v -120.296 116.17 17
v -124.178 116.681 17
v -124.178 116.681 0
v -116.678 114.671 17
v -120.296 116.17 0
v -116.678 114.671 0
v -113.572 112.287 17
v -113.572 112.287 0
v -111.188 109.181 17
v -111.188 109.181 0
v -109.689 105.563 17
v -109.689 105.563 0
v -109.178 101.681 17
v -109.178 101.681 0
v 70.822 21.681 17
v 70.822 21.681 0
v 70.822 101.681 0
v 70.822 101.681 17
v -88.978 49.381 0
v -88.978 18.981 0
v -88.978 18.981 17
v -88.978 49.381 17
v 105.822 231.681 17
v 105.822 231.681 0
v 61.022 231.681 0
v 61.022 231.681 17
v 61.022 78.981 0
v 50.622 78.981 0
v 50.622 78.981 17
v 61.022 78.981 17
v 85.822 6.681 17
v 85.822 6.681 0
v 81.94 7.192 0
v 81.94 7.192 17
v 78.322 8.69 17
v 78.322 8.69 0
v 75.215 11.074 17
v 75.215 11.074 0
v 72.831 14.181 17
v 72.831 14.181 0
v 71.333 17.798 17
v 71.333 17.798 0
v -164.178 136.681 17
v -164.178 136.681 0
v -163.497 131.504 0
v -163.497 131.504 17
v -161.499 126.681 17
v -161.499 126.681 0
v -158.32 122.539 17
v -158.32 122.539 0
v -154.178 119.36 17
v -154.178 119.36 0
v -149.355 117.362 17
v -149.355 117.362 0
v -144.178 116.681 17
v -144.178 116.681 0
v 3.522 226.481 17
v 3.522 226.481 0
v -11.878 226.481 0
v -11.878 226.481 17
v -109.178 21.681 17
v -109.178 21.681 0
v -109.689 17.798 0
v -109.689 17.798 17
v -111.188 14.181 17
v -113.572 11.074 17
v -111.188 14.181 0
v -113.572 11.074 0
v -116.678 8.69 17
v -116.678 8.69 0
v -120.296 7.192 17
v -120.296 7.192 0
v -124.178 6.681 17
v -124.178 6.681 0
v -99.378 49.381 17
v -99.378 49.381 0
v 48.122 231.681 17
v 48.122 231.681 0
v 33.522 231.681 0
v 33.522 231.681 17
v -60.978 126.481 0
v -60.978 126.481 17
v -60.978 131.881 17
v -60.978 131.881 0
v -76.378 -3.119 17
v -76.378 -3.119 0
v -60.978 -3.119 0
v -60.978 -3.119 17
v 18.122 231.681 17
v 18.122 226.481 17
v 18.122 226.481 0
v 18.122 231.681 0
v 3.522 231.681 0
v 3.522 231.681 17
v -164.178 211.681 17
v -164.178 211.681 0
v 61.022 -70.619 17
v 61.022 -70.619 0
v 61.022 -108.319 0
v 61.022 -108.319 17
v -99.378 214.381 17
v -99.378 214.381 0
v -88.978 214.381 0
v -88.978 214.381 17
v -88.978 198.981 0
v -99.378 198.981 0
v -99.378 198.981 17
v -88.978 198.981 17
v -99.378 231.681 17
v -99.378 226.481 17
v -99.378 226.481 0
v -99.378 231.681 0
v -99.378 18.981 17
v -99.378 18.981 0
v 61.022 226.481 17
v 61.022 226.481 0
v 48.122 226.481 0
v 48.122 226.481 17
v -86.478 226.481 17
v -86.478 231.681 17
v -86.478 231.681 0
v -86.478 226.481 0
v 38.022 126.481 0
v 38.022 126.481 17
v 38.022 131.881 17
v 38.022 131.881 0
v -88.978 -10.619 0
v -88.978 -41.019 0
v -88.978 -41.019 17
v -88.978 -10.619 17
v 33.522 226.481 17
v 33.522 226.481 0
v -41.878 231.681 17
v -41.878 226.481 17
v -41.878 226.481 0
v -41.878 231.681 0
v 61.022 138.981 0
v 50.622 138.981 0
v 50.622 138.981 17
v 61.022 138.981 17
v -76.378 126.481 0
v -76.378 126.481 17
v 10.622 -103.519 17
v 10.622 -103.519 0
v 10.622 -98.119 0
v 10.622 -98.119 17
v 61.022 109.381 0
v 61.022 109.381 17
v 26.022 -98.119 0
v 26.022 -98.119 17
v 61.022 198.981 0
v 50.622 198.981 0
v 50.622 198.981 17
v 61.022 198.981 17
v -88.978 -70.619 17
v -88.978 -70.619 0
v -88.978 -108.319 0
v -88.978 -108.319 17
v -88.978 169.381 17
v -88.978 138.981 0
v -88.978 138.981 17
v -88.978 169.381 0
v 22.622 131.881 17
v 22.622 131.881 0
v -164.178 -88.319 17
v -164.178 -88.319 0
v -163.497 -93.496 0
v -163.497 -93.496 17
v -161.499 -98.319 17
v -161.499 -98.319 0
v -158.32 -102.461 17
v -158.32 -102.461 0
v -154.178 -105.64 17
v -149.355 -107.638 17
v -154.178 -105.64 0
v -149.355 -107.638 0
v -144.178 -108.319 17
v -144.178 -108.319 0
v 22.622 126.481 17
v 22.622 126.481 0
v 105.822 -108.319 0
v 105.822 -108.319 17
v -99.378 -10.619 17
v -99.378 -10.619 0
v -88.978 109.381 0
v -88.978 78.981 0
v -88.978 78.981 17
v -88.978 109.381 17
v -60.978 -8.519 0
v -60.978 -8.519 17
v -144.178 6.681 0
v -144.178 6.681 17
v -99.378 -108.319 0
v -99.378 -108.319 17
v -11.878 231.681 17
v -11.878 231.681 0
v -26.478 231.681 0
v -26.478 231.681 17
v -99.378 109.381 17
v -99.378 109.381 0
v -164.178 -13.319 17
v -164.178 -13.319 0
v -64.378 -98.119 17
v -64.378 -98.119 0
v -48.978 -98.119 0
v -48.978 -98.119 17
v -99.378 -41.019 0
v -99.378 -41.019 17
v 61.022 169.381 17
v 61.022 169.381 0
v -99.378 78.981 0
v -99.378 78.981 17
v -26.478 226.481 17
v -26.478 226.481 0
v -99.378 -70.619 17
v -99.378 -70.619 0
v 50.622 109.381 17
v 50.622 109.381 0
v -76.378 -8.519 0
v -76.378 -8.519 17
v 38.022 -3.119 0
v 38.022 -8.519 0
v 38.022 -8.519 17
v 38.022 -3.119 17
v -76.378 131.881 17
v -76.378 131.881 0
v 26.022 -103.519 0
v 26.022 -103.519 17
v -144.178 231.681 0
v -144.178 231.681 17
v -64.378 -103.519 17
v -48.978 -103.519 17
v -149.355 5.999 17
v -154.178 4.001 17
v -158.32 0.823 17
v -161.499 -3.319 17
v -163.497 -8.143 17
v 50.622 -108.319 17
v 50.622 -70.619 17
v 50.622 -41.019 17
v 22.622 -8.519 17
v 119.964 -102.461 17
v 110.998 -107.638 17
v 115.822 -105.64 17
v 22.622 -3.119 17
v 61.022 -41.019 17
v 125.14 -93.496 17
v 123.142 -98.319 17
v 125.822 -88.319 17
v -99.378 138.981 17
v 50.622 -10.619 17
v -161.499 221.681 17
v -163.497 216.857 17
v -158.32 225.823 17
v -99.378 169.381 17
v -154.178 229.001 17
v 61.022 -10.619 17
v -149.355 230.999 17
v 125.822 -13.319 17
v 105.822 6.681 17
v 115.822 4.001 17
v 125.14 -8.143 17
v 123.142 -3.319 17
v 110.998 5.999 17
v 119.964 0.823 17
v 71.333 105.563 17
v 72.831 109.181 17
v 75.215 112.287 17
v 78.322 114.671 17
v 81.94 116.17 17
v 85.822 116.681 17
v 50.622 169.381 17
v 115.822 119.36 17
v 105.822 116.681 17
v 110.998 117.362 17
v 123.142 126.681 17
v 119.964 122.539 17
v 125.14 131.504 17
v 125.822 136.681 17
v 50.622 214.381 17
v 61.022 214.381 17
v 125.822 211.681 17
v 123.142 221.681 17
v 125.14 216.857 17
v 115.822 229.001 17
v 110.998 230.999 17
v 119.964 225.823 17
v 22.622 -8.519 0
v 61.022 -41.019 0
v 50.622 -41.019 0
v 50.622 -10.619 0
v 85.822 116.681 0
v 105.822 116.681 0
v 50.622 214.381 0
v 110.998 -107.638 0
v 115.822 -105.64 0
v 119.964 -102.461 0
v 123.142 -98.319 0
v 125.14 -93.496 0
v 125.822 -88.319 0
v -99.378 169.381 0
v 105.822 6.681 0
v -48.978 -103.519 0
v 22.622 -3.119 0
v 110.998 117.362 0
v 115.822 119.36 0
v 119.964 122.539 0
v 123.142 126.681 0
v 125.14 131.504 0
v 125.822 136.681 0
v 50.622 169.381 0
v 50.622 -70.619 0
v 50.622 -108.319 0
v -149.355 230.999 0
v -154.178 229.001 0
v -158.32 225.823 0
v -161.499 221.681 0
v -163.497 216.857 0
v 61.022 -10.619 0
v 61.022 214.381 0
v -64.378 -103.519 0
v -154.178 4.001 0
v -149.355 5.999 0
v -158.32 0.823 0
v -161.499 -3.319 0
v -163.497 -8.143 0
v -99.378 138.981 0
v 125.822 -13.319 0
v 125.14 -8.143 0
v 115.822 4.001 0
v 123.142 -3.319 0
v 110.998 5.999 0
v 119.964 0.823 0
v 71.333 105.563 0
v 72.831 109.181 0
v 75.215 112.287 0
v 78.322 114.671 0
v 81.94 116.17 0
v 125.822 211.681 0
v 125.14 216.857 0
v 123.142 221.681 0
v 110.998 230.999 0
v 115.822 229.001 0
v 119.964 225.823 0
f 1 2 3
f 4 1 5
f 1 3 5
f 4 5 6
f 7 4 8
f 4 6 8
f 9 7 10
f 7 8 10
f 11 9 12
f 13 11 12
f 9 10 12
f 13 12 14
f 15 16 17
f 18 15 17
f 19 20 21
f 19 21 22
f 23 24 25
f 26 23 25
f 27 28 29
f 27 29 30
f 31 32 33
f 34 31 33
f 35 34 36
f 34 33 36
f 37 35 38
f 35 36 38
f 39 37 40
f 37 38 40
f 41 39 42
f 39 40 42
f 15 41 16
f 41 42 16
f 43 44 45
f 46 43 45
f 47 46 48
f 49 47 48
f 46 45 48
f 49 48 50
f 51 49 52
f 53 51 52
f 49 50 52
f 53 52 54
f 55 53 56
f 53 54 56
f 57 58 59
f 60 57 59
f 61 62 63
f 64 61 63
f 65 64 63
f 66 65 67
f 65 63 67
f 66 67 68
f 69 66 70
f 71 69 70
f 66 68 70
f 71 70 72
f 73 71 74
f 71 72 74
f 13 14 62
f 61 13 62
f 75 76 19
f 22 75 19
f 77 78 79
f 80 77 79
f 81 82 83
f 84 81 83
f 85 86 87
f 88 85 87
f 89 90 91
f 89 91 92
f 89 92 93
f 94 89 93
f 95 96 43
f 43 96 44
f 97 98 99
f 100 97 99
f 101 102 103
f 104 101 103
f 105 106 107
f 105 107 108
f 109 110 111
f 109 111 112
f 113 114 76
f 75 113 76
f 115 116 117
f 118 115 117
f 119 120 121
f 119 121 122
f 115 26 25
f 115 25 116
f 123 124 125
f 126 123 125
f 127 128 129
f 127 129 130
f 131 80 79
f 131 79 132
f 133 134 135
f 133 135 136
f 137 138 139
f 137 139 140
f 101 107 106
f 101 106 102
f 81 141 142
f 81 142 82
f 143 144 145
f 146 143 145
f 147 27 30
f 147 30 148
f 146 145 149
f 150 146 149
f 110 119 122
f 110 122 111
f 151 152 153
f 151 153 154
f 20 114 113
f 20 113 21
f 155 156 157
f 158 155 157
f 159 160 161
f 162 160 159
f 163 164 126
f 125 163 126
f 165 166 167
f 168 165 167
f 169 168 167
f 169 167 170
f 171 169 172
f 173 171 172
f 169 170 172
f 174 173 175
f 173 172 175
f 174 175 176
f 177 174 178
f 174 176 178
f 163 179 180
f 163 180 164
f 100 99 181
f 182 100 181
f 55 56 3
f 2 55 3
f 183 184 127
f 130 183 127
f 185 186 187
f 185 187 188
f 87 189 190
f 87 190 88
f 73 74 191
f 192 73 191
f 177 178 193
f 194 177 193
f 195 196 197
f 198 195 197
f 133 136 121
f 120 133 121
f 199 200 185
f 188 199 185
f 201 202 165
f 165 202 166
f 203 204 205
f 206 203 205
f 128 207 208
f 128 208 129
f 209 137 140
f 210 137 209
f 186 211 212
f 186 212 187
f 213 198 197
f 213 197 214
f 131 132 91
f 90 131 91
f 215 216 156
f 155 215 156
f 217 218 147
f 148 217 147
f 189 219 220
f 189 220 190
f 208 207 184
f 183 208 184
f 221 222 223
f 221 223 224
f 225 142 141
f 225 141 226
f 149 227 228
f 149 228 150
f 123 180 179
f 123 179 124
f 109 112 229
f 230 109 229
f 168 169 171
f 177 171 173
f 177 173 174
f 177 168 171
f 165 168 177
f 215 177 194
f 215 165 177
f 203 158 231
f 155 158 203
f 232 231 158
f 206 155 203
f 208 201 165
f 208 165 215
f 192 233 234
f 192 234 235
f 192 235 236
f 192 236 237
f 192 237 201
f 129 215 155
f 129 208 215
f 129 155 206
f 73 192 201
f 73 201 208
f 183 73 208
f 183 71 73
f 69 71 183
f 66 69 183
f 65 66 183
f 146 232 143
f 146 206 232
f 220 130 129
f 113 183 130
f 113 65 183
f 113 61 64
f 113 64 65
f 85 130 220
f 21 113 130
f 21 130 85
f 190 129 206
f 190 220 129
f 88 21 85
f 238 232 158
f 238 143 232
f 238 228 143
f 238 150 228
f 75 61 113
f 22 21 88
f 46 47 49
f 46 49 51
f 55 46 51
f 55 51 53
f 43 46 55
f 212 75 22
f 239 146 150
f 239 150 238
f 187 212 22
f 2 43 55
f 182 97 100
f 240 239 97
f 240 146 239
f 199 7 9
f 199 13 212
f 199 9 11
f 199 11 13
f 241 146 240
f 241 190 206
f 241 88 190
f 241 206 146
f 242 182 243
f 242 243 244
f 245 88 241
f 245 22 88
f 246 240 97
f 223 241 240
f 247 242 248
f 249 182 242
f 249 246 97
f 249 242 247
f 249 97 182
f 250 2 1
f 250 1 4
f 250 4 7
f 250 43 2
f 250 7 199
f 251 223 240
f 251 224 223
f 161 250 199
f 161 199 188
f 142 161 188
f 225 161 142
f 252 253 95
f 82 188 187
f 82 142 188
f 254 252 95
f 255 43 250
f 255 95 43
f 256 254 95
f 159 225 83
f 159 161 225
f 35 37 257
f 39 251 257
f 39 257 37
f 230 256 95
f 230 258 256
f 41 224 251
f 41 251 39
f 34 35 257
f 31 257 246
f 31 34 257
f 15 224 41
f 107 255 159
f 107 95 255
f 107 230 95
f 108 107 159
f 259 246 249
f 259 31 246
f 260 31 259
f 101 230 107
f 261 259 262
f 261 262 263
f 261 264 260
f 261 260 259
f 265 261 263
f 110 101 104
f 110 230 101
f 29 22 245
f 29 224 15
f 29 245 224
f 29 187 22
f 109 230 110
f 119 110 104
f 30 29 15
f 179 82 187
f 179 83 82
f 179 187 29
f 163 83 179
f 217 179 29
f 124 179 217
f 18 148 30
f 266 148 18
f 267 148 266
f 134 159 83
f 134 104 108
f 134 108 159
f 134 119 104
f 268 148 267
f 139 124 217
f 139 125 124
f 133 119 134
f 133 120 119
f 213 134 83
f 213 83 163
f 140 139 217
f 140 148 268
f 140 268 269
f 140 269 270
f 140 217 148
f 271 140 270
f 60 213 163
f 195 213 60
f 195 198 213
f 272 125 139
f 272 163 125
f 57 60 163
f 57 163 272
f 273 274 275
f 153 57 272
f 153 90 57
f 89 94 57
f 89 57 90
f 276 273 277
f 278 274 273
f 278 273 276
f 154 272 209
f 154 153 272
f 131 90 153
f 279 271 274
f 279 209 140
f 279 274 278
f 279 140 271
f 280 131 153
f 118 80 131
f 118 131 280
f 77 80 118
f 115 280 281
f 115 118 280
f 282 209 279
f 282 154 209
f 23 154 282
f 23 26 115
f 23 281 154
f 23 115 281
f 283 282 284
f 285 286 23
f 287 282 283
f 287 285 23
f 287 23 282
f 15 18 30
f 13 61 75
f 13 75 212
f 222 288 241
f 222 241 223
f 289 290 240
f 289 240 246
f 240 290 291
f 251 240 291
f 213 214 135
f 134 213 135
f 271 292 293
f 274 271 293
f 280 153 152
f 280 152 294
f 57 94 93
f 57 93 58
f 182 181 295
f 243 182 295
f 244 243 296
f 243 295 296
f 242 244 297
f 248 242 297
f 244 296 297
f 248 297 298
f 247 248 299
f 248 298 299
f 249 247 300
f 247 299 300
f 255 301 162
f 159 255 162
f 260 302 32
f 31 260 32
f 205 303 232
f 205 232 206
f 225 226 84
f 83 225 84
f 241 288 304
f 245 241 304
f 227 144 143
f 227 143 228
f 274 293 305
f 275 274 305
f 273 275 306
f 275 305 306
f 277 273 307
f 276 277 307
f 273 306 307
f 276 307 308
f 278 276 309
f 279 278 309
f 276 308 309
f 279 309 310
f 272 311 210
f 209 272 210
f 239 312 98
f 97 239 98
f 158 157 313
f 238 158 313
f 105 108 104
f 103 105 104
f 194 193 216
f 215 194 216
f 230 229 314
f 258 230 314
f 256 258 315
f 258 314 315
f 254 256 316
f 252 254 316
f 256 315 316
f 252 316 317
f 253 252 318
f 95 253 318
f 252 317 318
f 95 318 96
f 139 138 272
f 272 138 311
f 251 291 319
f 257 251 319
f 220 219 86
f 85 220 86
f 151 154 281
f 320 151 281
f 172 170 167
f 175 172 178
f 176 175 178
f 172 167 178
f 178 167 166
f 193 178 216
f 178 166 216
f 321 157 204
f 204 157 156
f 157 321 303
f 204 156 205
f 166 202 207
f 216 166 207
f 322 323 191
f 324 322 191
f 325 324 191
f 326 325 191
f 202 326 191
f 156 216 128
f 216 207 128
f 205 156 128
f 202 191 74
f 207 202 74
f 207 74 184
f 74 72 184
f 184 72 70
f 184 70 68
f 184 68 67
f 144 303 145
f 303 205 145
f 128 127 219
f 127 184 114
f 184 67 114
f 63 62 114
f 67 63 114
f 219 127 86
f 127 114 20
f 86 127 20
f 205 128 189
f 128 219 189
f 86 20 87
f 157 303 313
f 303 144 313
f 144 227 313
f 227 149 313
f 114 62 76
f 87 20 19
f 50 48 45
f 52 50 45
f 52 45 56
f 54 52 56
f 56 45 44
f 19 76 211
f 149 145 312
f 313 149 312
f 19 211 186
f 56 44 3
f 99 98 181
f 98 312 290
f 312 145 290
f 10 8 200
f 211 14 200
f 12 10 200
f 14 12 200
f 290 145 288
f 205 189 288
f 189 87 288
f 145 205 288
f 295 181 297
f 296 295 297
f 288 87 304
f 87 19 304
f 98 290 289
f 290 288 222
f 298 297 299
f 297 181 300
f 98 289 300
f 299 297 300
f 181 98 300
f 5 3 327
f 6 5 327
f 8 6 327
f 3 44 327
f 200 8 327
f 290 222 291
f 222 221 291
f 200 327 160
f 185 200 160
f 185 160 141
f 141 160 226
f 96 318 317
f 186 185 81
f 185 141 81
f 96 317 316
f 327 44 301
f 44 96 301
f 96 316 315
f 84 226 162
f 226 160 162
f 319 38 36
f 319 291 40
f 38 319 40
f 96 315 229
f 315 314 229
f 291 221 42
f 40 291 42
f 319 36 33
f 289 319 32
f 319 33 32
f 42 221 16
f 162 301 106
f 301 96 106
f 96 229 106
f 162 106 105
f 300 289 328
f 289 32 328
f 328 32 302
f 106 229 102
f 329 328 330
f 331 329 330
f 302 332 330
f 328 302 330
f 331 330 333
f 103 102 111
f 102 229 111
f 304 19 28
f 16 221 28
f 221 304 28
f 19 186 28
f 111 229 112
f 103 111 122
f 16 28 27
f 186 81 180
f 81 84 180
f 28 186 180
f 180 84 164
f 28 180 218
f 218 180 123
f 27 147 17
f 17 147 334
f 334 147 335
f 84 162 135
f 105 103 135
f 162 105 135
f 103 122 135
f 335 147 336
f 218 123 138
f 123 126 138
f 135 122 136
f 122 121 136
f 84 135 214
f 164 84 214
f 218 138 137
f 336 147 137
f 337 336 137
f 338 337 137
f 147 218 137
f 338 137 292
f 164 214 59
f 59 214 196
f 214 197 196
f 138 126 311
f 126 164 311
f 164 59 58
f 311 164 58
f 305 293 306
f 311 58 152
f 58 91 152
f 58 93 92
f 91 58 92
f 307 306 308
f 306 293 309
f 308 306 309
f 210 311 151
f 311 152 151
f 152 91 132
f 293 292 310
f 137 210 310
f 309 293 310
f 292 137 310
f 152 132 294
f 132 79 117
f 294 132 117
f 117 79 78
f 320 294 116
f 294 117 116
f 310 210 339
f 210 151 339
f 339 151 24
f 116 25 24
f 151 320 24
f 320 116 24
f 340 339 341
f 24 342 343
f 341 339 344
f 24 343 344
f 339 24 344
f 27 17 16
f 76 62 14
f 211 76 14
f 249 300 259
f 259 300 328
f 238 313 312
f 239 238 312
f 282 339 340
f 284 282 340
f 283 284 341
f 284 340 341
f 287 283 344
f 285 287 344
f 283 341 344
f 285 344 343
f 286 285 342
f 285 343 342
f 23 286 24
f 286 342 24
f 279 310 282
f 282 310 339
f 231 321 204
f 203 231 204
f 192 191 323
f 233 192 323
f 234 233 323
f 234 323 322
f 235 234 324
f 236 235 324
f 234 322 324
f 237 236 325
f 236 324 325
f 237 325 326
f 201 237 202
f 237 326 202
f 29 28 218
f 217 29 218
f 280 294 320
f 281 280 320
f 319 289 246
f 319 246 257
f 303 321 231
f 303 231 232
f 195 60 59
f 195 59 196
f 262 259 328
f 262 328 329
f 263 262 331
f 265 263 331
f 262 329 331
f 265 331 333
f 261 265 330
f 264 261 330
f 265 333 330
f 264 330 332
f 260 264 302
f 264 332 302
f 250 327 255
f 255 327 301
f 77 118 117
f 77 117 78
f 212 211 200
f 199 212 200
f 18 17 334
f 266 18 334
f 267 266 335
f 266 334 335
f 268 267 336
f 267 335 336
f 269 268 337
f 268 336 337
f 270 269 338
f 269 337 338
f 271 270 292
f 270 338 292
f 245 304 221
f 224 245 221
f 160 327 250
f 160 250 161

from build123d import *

# Parameters (mm, degrees)
MODEL_W             = 15.4
MODEL_H             = 5.4
MODEL_W_2           = 10.4
MODEL_H_2           = 15.4
MODEL_H_3           = 30.4
BOSS_EXTRUDE1_DEPTH = 17


with BuildPart() as part:
    # Model → Boss-Extrude1 (new body)
    with BuildSketch(Plane.XY):
        with BuildLine():
            Line((-144.178149878, -108.319218198), (-99.378149878, -108.319218198))
            Line((-99.378149878, -108.319218198), (-99.378149878, -70.619218198))
            Line((-99.378149878, -70.619218198), (-88.978149878, -70.619218198))
            Line((-88.978149878, -70.619218198), (-88.978149878, -108.319218198))
            Line((-88.978149878, -108.319218198), (50.621850122, -108.319218198))
            Line((50.621850122, -108.319218198), (50.621850122, -70.619218198))
            Line((50.621850122, -70.619218198), (61.021850122, -70.619218198))
            Line((61.021850122, -70.619218198), (61.021850122, -108.319218198))
            Line((61.021850122, -108.319218198), (105.821850122, -108.319218198))
            ThreePointArc((105.821850122, -108.319218198), (119.963985745, -102.461353822), (125.821850122, -88.319218198))
            Line((125.821850122, -88.319218198), (125.821850122, -13.319218198))
            ThreePointArc((125.821850122, -13.319218198), (119.963985745, 0.822917426), (105.821850122, 6.680781802))
            Line((105.821850122, 6.680781802), (85.821850122, 6.680781802))
            ThreePointArc((85.821850122, 6.680781802), (75.215248404, 11.074180084), (70.821850122, 21.680781802))
            Line((70.821850122, 21.680781802), (70.821850122, 101.680781802))
            ThreePointArc((70.821850122, 101.680781802), (75.215248404, 112.28738352), (85.821850122, 116.680781802))
            Line((85.821850122, 116.680781802), (105.821850122, 116.680781802))
            ThreePointArc((105.821850122, 116.680781802), (119.963985745, 122.538646178), (125.821850122, 136.680781802))
            Line((125.821850122, 136.680781802), (125.821850122, 211.680781802))
            ThreePointArc((125.821850122, 211.680781802), (119.963985745, 225.822917426), (105.821850122, 231.680781802))
            Line((105.821850122, 231.680781802), (61.021850122, 231.680781802))
            Line((61.021850122, 231.680781802), (61.021850122, 226.480781802))
            Line((61.021850122, 226.480781802), (48.121850122, 226.480781802))
            Line((48.121850122, 226.480781802), (48.121850122, 231.680781802))
            Line((48.121850122, 231.680781802), (33.521850122, 231.680781802))
            Line((33.521850122, 231.680781802), (33.521850122, 226.480781802))
            Line((33.521850122, 226.480781802), (18.121850122, 226.480781802))
            Line((18.121850122, 226.480781802), (18.121850122, 231.680781802))
            Line((18.121850122, 231.680781802), (3.521850122, 231.680781802))
            Line((3.521850122, 231.680781802), (3.521850122, 226.480781802))
            Line((3.521850122, 226.480781802), (-11.878149878, 226.480781802))
            Line((-11.878149878, 226.480781802), (-11.878149878, 231.680781802))
            Line((-11.878149878, 231.680781802), (-26.478149878, 231.680781802))
            Line((-26.478149878, 231.680781802), (-26.478149878, 226.480781802))
            Line((-26.478149878, 226.480781802), (-41.878149878, 226.480781802))
            Line((-41.878149878, 226.480781802), (-41.878149878, 231.680781802))
            Line((-41.878149878, 231.680781802), (-86.478149878, 231.680781802))
            Line((-86.478149878, 231.680781802), (-86.478149878, 226.480781802))
            Line((-86.478149878, 226.480781802), (-99.378149878, 226.480781802))
            Line((-99.378149878, 226.480781802), (-99.378149878, 231.680781802))
            Line((-99.378149878, 231.680781802), (-144.178149878, 231.680781802))
            ThreePointArc((-144.178149878, 231.680781802), (-158.320285502, 225.822917426), (-164.178149878, 211.680781802))
            Line((-164.178149878, 211.680781802), (-164.178149878, 136.680781802))
            ThreePointArc((-164.178149878, 136.680781802), (-158.320285502, 122.538646178), (-144.178149878, 116.680781802))
            Line((-144.178149878, 116.680781802), (-124.178149878, 116.680781802))
            ThreePointArc((-124.178149878, 116.680781802), (-113.571548161, 112.28738352), (-109.178149878, 101.680781802))
            Line((-109.178149878, 101.680781802), (-109.178149878, 21.680781802))
            ThreePointArc((-109.178149878, 21.680781802), (-113.571548161, 11.074180084), (-124.178149878, 6.680781802))
            Line((-124.178149878, 6.680781802), (-144.178149878, 6.680781802))
            ThreePointArc((-144.178149878, 6.680781802), (-158.320285502, 0.822917426), (-164.178149878, -13.319218198))
            Line((-164.178149878, -13.319218198), (-164.178149878, -88.319218198))
            ThreePointArc((-164.178149878, -88.319218198), (-158.320285502, -102.461353822), (-144.178149878, -108.319218198))
        make_face()
        with Locations((30.321850122, 129.180781802)):
            Rectangle(MODEL_W, MODEL_H, mode=Mode.SUBTRACT)
        with Locations((-68.678149878, 129.180781802)):
            Rectangle(MODEL_W, MODEL_H, mode=Mode.SUBTRACT)
        with Locations((30.321850122, -5.819218198)):
            Rectangle(MODEL_W, MODEL_H, mode=Mode.SUBTRACT)
        with Locations((-68.678149878, -5.819218198)):
            Rectangle(MODEL_W, MODEL_H, mode=Mode.SUBTRACT)
        with Locations((-94.178149878, 206.680781802)):
            Rectangle(MODEL_W_2, MODEL_H_2, mode=Mode.SUBTRACT)
        with Locations((-94.178149878, -25.819218198)):
            Rectangle(MODEL_W_2, MODEL_H_3, mode=Mode.SUBTRACT)
        with Locations((-94.178149878, 94.180781802)):
            Rectangle(MODEL_W_2, MODEL_H_3, mode=Mode.SUBTRACT)
        with Locations((-94.178149878, 154.180781802)):
            Rectangle(MODEL_W_2, MODEL_H_3, mode=Mode.SUBTRACT)
        with Locations((55.821850122, -25.819218198)):
            Rectangle(MODEL_W_2, MODEL_H_3, mode=Mode.SUBTRACT)
        with Locations((55.821850122, 94.180781802)):
            Rectangle(MODEL_W_2, MODEL_H_3, mode=Mode.SUBTRACT)
        with Locations((55.821850122, 154.180781802)):
            Rectangle(MODEL_W_2, MODEL_H_3, mode=Mode.SUBTRACT)
        with Locations((18.321850122, -100.819218198)):
            Rectangle(MODEL_W, MODEL_H, mode=Mode.SUBTRACT)
        with Locations((-56.678149878, -100.819218198)):
            Rectangle(MODEL_W, MODEL_H, mode=Mode.SUBTRACT)
        with Locations((55.821850122, 206.680781802)):
            Rectangle(MODEL_W_2, MODEL_H_2, mode=Mode.SUBTRACT)
        with Locations((-94.178149878, 34.180781802)):
            Rectangle(MODEL_W_2, MODEL_H_3, mode=Mode.SUBTRACT)
    extrude(amount=BOSS_EXTRUDE1_DEPTH)


solid = part.part
